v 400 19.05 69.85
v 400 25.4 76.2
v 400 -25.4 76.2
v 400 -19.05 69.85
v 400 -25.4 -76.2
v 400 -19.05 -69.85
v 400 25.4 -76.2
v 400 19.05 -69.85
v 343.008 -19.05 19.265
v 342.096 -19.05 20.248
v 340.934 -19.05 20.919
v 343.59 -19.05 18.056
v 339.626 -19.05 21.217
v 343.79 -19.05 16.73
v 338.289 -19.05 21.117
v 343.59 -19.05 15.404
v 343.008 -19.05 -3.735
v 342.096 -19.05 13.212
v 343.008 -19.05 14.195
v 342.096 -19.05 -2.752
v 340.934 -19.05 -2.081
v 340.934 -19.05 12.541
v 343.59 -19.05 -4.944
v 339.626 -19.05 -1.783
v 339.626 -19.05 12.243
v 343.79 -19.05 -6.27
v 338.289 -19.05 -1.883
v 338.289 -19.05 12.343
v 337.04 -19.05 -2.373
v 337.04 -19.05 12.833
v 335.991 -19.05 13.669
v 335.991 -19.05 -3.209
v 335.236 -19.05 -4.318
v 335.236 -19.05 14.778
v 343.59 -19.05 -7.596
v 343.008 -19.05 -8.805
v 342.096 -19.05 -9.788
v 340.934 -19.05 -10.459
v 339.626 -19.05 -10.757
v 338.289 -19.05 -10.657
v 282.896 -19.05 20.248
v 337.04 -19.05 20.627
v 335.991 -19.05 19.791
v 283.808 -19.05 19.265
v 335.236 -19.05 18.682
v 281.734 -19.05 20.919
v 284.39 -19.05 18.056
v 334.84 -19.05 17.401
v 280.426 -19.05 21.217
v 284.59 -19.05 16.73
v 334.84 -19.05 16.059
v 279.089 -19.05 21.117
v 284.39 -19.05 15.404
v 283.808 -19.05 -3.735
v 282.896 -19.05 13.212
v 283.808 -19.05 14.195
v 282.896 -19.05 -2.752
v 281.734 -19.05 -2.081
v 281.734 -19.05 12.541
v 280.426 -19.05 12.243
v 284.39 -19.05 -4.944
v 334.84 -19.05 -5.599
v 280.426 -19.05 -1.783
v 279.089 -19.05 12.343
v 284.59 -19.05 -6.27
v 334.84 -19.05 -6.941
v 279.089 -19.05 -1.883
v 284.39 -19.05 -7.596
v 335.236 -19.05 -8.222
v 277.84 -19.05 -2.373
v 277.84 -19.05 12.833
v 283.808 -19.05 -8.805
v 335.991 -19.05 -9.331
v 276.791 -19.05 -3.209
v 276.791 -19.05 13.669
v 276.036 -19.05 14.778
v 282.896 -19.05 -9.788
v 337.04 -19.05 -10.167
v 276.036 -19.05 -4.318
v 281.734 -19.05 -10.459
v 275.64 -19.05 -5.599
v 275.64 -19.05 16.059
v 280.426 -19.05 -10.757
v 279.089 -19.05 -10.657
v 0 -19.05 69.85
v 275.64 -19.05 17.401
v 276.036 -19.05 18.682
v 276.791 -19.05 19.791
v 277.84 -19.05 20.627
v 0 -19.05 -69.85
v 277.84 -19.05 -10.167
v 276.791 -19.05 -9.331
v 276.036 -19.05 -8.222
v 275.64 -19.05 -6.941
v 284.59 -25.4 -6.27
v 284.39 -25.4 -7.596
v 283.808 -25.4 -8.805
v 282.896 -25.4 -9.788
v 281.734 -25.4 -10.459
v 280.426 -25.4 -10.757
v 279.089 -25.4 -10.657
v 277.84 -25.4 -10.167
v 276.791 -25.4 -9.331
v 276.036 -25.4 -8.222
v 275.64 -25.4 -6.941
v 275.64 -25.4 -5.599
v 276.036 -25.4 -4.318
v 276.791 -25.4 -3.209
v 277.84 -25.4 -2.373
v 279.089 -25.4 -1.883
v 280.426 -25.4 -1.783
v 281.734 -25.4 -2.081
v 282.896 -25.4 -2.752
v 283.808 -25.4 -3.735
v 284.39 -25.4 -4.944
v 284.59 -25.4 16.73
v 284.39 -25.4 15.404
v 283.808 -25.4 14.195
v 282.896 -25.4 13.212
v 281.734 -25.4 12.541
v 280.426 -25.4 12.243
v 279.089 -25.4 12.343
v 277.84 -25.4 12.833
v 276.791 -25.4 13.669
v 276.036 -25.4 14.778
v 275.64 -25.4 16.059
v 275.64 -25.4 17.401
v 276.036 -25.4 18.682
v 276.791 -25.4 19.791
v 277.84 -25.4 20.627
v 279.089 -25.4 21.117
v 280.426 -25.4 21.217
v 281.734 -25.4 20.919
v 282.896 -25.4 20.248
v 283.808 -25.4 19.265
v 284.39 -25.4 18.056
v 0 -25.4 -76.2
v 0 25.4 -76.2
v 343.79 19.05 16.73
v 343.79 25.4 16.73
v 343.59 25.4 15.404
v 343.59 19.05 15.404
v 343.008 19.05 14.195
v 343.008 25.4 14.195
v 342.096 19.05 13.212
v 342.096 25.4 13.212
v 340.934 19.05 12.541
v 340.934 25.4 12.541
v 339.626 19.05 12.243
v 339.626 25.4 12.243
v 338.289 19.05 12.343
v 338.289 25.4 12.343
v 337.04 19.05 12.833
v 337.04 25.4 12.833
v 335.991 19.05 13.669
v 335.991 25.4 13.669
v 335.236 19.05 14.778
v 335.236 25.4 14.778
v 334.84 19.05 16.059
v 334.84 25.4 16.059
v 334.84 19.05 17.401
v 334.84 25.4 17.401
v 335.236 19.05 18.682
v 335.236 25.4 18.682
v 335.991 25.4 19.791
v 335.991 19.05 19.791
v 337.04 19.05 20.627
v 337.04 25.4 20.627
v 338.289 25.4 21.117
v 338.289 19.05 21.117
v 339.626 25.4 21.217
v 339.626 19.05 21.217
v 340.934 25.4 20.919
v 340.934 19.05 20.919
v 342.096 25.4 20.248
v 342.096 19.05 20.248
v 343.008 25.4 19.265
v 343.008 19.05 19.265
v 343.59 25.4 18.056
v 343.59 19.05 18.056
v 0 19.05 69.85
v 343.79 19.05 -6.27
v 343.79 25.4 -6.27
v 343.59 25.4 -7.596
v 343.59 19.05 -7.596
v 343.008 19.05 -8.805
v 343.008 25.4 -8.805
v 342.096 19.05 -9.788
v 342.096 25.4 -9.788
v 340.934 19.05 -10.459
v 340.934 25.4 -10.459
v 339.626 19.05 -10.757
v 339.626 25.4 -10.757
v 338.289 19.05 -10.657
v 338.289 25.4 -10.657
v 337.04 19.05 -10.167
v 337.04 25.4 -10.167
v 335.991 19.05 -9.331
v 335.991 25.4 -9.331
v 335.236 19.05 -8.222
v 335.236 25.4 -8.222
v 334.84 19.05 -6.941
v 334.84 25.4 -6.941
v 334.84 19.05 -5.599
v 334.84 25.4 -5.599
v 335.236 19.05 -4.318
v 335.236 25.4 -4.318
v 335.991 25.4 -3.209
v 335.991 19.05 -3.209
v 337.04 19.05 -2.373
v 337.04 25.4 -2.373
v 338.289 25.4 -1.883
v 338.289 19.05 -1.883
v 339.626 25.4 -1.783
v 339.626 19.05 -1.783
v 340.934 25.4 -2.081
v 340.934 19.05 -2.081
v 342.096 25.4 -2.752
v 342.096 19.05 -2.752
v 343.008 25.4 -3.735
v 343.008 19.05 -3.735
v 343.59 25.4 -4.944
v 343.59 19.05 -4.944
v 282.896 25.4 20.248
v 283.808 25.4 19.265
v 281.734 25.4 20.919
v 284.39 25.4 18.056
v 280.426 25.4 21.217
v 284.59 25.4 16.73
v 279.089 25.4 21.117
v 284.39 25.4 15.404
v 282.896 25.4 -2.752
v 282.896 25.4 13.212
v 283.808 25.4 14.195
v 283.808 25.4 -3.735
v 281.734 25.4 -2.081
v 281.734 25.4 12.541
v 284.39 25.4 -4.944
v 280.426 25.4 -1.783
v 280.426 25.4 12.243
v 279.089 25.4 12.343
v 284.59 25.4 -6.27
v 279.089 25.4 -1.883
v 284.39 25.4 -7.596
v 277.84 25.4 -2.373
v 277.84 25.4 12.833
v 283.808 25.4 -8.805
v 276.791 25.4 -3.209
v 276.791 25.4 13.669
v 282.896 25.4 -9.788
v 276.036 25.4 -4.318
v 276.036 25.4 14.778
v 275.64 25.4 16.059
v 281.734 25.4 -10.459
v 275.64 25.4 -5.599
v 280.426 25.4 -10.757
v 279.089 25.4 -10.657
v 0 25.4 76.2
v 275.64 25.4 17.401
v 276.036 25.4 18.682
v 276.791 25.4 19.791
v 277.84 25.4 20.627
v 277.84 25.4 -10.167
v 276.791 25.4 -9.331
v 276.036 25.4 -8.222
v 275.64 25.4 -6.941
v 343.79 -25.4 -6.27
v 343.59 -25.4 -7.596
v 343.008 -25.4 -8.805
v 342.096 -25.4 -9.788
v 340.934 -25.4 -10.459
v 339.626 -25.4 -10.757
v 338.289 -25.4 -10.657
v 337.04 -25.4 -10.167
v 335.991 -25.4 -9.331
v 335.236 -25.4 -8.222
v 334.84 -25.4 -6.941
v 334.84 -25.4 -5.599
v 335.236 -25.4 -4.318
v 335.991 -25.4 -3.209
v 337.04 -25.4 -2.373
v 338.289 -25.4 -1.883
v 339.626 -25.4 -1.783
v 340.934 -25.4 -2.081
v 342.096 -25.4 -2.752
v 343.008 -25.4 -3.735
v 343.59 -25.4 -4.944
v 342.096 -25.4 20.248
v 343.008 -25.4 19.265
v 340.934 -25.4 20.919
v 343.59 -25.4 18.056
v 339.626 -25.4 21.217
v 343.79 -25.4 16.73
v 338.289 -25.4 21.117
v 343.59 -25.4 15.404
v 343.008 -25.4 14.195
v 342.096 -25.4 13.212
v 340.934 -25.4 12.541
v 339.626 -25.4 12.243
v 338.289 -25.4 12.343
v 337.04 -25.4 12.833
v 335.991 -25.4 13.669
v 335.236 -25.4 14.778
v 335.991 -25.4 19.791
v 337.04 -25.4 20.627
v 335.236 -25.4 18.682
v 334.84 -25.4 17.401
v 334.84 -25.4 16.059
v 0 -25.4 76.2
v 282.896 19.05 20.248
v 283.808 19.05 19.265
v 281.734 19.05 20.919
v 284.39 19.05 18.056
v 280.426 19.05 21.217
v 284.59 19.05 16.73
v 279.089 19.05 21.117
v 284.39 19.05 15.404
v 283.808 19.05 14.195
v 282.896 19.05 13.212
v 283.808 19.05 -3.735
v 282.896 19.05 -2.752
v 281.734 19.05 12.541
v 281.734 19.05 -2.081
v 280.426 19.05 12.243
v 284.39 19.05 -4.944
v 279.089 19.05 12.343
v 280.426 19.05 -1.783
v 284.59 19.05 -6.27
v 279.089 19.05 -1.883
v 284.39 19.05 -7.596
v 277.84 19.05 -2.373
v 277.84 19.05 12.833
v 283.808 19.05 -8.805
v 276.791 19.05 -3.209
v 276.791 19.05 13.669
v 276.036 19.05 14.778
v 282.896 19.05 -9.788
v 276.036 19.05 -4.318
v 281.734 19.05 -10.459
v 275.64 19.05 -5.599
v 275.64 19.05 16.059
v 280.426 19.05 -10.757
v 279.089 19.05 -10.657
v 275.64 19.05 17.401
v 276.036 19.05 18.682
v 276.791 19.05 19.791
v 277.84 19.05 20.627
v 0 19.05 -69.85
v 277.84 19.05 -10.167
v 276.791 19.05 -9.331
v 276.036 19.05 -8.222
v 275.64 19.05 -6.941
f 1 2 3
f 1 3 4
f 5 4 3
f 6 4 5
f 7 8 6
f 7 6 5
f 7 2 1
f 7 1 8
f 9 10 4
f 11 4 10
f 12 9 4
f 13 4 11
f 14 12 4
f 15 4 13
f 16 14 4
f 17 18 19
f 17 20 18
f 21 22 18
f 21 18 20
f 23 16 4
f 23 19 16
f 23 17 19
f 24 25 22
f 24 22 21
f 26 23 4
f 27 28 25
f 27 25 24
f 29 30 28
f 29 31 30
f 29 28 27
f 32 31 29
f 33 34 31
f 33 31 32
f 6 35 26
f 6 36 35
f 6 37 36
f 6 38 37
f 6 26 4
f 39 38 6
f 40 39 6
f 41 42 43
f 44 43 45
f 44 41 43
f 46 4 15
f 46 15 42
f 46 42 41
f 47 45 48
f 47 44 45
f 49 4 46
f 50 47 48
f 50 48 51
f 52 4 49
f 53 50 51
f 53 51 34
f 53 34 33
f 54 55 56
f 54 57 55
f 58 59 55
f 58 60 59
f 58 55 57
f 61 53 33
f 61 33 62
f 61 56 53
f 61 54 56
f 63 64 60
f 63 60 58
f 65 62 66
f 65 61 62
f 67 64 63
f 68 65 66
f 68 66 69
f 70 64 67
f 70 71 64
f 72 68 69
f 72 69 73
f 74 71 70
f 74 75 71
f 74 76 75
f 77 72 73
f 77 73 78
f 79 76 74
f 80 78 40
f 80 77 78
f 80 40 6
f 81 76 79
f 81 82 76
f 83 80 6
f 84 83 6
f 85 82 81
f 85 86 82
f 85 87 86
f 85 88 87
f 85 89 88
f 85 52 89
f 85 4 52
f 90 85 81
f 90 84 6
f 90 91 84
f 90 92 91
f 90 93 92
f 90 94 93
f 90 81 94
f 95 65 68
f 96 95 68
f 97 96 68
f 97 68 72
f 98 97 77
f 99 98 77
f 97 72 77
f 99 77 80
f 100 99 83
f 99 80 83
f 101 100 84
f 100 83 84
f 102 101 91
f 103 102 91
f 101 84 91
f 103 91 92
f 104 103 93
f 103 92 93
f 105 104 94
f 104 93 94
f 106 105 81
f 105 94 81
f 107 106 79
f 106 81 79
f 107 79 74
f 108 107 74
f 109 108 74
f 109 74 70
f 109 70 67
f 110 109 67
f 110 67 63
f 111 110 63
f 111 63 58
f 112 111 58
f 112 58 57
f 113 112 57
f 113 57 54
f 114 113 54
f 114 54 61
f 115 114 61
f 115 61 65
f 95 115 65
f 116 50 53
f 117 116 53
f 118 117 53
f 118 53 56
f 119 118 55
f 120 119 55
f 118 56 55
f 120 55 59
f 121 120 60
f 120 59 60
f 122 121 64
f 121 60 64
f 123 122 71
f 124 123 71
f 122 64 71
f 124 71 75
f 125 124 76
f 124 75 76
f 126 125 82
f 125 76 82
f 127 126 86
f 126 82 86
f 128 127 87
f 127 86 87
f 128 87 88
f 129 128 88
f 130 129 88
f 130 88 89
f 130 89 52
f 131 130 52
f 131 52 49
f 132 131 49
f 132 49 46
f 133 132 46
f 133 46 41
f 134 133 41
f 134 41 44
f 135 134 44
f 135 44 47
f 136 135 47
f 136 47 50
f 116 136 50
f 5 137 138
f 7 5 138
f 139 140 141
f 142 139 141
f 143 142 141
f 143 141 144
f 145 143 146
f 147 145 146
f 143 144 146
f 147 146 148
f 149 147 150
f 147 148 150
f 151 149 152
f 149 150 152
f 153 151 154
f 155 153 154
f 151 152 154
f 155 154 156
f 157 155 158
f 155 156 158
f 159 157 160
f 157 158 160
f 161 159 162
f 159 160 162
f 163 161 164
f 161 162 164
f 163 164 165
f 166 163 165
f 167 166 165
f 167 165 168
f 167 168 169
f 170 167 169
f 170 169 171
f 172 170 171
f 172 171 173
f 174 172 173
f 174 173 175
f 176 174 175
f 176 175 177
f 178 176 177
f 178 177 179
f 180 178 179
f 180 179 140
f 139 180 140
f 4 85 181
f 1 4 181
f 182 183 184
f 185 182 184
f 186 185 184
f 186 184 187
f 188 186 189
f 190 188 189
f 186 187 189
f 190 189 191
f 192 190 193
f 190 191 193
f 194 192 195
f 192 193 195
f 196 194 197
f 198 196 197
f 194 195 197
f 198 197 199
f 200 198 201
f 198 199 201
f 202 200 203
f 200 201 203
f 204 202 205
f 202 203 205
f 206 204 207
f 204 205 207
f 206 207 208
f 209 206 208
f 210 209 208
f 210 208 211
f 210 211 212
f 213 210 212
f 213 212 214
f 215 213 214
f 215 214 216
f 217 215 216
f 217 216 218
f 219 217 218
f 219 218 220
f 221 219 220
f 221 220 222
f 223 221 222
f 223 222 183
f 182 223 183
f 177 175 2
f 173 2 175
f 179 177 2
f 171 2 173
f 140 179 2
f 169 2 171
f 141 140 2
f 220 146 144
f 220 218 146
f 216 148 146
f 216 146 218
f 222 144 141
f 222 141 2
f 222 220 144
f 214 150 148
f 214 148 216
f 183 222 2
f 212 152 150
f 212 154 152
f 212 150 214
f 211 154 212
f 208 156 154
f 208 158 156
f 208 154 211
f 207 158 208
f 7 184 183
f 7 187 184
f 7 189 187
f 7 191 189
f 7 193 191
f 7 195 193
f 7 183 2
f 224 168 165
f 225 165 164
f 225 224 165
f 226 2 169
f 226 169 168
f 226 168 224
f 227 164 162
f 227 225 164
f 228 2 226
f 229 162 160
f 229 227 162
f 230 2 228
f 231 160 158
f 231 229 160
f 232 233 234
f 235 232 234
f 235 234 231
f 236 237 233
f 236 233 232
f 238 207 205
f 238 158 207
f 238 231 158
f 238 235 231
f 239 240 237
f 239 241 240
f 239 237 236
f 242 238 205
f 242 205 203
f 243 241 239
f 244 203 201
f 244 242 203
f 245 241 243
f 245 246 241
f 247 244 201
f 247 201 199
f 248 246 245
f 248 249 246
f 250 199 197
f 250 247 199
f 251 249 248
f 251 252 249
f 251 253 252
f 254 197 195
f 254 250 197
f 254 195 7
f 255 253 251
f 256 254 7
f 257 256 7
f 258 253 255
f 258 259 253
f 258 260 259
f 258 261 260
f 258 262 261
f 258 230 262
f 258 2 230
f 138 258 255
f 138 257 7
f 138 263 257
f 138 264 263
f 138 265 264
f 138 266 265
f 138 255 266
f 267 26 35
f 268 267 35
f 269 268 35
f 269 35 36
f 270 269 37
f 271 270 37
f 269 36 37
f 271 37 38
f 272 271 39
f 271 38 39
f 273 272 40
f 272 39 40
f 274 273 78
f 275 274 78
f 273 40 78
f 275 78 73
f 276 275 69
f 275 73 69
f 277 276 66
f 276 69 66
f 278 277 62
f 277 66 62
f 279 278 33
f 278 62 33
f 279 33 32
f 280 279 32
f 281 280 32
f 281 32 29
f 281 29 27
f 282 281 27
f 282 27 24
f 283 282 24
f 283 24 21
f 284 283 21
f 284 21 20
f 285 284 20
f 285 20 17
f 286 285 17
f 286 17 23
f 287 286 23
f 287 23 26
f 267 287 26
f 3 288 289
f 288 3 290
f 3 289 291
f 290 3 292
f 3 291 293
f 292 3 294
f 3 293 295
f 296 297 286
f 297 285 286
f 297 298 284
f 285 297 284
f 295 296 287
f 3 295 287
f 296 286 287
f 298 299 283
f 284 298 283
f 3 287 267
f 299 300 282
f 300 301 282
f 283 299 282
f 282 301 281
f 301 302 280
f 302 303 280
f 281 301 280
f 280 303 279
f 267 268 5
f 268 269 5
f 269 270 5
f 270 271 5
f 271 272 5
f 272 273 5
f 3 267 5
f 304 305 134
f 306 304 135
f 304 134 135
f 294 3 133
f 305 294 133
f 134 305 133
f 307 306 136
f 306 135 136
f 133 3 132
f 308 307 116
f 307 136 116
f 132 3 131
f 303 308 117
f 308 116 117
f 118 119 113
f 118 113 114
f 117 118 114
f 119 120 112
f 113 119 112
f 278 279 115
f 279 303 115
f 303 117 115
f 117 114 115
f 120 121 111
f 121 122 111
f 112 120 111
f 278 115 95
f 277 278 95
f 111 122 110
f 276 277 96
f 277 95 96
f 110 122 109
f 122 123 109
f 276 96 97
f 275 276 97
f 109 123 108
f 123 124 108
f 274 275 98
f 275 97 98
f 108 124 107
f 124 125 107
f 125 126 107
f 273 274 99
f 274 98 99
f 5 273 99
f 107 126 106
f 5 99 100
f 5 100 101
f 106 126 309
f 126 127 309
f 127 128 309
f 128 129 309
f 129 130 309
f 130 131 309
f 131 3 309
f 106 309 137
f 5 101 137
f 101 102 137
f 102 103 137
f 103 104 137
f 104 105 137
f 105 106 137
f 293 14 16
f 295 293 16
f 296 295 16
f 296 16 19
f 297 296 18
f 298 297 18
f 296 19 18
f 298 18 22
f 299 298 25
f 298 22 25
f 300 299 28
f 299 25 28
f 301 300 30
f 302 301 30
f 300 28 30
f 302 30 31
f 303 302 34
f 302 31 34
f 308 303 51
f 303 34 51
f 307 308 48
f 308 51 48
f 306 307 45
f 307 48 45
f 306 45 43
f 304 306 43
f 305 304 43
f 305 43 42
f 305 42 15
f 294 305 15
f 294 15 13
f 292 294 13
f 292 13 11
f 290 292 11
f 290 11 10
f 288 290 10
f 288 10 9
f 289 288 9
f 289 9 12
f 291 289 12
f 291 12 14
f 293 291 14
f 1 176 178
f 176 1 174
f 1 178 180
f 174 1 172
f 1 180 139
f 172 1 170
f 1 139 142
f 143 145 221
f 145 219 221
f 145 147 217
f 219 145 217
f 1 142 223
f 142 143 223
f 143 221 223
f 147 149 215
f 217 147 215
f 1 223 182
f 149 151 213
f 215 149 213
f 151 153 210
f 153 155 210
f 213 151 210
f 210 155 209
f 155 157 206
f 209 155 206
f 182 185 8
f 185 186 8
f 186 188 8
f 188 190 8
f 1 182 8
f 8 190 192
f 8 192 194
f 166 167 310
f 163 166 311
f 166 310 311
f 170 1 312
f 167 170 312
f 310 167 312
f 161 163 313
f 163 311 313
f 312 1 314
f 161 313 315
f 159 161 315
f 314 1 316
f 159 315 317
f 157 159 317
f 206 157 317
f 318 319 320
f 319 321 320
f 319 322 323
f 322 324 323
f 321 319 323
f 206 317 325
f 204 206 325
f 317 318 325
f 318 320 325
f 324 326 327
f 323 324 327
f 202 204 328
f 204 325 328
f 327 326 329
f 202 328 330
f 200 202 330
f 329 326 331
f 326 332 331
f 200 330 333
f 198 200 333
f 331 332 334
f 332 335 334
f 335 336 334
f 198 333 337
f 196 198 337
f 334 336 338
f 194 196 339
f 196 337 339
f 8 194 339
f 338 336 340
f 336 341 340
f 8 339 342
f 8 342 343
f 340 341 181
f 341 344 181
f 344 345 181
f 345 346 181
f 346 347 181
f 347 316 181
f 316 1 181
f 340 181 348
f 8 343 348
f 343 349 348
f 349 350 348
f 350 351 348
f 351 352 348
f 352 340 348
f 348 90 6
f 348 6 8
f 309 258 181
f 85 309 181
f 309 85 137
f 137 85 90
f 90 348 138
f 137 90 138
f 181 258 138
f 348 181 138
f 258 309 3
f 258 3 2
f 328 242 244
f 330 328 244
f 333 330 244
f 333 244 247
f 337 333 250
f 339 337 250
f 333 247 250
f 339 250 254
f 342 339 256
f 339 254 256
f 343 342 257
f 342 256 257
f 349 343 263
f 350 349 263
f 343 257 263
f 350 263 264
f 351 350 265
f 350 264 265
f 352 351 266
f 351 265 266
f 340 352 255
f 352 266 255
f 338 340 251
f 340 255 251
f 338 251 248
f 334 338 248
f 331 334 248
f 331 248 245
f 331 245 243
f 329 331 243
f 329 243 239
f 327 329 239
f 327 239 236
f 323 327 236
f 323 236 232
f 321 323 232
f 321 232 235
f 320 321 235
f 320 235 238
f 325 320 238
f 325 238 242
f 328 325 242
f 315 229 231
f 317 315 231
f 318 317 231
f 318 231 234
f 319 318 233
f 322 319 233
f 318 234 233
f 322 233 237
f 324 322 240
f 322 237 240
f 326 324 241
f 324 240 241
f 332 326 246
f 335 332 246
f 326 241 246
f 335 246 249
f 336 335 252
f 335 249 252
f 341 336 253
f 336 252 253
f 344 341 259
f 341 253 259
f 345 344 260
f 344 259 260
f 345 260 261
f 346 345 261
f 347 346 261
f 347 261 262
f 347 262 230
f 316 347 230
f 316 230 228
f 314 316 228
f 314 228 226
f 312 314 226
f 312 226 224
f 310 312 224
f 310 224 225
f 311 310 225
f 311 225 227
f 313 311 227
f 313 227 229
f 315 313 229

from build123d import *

# Parameters (mm, degrees)
SKETCH1_W            = 152.4
SKETCH1_H            = 50.8
SKETCH1_W_2          = 139.7
SKETCH1_H_2          = 38.1
BOSS_EXTRUDE1_DEPTH  = 400
M8_CLEARANCE_HOLE1_D = 9


with BuildPart() as part:
    # Sketch1 → Boss-Extrude1 (new body)
    with BuildSketch(Plane(origin=(0, 0, 0), x_dir=(0, 0, -1), z_dir=(1, 0, 0))):
        Rectangle(SKETCH1_W, SKETCH1_H)
        Rectangle(SKETCH1_W_2, SKETCH1_H_2, mode=Mode.SUBTRACT)
    extrude(amount=BOSS_EXTRUDE1_DEPTH)

    # M8 Clearance Hole1 (through all)
    with Locations(Plane(origin=(0, -25.4, 0), x_dir=(-1, 0, 0), z_dir=(0, -1, 0))):
        with Locations((-280.09, -16.73), (-280.09, 6.27), (-339.29, 6.27), (-339.29, -16.73)):
            Hole(M8_CLEARANCE_HOLE1_D / 2)


solid = part.part
